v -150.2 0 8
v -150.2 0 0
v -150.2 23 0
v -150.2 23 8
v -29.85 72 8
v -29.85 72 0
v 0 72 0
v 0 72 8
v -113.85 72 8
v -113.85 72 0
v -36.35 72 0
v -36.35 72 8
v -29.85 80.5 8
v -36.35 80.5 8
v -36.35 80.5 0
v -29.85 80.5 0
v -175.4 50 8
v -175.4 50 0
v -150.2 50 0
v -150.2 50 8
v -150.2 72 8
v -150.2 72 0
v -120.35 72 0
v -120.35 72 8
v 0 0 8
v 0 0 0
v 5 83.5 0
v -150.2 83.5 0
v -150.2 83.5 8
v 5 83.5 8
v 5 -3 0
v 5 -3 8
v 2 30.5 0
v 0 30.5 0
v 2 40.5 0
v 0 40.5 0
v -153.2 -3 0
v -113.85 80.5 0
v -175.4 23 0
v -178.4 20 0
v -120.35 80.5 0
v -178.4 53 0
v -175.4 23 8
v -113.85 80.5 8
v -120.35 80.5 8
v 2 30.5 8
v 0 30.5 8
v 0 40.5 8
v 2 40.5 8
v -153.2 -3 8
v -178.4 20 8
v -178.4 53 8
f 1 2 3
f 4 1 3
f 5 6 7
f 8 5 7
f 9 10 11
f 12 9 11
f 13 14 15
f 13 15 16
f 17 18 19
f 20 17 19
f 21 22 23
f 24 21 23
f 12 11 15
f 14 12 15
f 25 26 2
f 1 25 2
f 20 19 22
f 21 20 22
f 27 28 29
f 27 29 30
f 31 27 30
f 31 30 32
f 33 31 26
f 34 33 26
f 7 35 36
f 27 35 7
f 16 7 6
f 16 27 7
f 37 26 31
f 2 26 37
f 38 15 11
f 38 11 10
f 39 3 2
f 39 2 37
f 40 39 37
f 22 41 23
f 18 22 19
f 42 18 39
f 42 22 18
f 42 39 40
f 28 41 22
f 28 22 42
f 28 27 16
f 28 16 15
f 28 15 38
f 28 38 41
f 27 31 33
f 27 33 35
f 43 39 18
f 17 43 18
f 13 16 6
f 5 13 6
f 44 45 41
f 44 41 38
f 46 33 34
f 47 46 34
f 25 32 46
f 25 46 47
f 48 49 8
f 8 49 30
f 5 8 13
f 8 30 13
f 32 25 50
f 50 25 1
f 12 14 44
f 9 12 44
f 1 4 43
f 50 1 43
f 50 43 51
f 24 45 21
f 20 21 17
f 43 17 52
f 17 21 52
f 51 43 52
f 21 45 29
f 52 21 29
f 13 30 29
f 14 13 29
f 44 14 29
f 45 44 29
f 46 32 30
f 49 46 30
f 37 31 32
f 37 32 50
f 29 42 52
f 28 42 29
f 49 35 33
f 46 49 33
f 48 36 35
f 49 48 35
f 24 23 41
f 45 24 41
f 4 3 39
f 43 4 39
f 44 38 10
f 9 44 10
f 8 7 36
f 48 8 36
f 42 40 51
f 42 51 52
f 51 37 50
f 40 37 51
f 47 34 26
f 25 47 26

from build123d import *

# Parameters (mm, degrees)
BOSS_EXTRUDE1_DEPTH = 8


with BuildPart() as part:
    # Sketch1 → Boss-Extrude1 (new body)
    with BuildSketch(Plane.XY):
        Polygon((-178.4, 53), (-150.2, 83.5), (5, 83.5), (5, -3), (-153.2, -3), (-178.4, 20), align=None)
        Polygon((-150.2, 72), (-120.35, 72), (-120.35, 80.5), (-113.85, 80.5), (-113.85, 72), (-36.35, 72), (-36.35, 80.5), (-29.85, 80.5), (-29.85, 72), (0, 72), (0, 40.5), (2, 40.5), (2, 30.5), (0, 30.5), (0, 0), (-150.2, 0), (-150.2, 23), (-175.4, 23), (-175.4, 50), (-150.2, 50), align=None, mode=Mode.SUBTRACT)
    extrude(amount=BOSS_EXTRUDE1_DEPTH)


solid = part.part
